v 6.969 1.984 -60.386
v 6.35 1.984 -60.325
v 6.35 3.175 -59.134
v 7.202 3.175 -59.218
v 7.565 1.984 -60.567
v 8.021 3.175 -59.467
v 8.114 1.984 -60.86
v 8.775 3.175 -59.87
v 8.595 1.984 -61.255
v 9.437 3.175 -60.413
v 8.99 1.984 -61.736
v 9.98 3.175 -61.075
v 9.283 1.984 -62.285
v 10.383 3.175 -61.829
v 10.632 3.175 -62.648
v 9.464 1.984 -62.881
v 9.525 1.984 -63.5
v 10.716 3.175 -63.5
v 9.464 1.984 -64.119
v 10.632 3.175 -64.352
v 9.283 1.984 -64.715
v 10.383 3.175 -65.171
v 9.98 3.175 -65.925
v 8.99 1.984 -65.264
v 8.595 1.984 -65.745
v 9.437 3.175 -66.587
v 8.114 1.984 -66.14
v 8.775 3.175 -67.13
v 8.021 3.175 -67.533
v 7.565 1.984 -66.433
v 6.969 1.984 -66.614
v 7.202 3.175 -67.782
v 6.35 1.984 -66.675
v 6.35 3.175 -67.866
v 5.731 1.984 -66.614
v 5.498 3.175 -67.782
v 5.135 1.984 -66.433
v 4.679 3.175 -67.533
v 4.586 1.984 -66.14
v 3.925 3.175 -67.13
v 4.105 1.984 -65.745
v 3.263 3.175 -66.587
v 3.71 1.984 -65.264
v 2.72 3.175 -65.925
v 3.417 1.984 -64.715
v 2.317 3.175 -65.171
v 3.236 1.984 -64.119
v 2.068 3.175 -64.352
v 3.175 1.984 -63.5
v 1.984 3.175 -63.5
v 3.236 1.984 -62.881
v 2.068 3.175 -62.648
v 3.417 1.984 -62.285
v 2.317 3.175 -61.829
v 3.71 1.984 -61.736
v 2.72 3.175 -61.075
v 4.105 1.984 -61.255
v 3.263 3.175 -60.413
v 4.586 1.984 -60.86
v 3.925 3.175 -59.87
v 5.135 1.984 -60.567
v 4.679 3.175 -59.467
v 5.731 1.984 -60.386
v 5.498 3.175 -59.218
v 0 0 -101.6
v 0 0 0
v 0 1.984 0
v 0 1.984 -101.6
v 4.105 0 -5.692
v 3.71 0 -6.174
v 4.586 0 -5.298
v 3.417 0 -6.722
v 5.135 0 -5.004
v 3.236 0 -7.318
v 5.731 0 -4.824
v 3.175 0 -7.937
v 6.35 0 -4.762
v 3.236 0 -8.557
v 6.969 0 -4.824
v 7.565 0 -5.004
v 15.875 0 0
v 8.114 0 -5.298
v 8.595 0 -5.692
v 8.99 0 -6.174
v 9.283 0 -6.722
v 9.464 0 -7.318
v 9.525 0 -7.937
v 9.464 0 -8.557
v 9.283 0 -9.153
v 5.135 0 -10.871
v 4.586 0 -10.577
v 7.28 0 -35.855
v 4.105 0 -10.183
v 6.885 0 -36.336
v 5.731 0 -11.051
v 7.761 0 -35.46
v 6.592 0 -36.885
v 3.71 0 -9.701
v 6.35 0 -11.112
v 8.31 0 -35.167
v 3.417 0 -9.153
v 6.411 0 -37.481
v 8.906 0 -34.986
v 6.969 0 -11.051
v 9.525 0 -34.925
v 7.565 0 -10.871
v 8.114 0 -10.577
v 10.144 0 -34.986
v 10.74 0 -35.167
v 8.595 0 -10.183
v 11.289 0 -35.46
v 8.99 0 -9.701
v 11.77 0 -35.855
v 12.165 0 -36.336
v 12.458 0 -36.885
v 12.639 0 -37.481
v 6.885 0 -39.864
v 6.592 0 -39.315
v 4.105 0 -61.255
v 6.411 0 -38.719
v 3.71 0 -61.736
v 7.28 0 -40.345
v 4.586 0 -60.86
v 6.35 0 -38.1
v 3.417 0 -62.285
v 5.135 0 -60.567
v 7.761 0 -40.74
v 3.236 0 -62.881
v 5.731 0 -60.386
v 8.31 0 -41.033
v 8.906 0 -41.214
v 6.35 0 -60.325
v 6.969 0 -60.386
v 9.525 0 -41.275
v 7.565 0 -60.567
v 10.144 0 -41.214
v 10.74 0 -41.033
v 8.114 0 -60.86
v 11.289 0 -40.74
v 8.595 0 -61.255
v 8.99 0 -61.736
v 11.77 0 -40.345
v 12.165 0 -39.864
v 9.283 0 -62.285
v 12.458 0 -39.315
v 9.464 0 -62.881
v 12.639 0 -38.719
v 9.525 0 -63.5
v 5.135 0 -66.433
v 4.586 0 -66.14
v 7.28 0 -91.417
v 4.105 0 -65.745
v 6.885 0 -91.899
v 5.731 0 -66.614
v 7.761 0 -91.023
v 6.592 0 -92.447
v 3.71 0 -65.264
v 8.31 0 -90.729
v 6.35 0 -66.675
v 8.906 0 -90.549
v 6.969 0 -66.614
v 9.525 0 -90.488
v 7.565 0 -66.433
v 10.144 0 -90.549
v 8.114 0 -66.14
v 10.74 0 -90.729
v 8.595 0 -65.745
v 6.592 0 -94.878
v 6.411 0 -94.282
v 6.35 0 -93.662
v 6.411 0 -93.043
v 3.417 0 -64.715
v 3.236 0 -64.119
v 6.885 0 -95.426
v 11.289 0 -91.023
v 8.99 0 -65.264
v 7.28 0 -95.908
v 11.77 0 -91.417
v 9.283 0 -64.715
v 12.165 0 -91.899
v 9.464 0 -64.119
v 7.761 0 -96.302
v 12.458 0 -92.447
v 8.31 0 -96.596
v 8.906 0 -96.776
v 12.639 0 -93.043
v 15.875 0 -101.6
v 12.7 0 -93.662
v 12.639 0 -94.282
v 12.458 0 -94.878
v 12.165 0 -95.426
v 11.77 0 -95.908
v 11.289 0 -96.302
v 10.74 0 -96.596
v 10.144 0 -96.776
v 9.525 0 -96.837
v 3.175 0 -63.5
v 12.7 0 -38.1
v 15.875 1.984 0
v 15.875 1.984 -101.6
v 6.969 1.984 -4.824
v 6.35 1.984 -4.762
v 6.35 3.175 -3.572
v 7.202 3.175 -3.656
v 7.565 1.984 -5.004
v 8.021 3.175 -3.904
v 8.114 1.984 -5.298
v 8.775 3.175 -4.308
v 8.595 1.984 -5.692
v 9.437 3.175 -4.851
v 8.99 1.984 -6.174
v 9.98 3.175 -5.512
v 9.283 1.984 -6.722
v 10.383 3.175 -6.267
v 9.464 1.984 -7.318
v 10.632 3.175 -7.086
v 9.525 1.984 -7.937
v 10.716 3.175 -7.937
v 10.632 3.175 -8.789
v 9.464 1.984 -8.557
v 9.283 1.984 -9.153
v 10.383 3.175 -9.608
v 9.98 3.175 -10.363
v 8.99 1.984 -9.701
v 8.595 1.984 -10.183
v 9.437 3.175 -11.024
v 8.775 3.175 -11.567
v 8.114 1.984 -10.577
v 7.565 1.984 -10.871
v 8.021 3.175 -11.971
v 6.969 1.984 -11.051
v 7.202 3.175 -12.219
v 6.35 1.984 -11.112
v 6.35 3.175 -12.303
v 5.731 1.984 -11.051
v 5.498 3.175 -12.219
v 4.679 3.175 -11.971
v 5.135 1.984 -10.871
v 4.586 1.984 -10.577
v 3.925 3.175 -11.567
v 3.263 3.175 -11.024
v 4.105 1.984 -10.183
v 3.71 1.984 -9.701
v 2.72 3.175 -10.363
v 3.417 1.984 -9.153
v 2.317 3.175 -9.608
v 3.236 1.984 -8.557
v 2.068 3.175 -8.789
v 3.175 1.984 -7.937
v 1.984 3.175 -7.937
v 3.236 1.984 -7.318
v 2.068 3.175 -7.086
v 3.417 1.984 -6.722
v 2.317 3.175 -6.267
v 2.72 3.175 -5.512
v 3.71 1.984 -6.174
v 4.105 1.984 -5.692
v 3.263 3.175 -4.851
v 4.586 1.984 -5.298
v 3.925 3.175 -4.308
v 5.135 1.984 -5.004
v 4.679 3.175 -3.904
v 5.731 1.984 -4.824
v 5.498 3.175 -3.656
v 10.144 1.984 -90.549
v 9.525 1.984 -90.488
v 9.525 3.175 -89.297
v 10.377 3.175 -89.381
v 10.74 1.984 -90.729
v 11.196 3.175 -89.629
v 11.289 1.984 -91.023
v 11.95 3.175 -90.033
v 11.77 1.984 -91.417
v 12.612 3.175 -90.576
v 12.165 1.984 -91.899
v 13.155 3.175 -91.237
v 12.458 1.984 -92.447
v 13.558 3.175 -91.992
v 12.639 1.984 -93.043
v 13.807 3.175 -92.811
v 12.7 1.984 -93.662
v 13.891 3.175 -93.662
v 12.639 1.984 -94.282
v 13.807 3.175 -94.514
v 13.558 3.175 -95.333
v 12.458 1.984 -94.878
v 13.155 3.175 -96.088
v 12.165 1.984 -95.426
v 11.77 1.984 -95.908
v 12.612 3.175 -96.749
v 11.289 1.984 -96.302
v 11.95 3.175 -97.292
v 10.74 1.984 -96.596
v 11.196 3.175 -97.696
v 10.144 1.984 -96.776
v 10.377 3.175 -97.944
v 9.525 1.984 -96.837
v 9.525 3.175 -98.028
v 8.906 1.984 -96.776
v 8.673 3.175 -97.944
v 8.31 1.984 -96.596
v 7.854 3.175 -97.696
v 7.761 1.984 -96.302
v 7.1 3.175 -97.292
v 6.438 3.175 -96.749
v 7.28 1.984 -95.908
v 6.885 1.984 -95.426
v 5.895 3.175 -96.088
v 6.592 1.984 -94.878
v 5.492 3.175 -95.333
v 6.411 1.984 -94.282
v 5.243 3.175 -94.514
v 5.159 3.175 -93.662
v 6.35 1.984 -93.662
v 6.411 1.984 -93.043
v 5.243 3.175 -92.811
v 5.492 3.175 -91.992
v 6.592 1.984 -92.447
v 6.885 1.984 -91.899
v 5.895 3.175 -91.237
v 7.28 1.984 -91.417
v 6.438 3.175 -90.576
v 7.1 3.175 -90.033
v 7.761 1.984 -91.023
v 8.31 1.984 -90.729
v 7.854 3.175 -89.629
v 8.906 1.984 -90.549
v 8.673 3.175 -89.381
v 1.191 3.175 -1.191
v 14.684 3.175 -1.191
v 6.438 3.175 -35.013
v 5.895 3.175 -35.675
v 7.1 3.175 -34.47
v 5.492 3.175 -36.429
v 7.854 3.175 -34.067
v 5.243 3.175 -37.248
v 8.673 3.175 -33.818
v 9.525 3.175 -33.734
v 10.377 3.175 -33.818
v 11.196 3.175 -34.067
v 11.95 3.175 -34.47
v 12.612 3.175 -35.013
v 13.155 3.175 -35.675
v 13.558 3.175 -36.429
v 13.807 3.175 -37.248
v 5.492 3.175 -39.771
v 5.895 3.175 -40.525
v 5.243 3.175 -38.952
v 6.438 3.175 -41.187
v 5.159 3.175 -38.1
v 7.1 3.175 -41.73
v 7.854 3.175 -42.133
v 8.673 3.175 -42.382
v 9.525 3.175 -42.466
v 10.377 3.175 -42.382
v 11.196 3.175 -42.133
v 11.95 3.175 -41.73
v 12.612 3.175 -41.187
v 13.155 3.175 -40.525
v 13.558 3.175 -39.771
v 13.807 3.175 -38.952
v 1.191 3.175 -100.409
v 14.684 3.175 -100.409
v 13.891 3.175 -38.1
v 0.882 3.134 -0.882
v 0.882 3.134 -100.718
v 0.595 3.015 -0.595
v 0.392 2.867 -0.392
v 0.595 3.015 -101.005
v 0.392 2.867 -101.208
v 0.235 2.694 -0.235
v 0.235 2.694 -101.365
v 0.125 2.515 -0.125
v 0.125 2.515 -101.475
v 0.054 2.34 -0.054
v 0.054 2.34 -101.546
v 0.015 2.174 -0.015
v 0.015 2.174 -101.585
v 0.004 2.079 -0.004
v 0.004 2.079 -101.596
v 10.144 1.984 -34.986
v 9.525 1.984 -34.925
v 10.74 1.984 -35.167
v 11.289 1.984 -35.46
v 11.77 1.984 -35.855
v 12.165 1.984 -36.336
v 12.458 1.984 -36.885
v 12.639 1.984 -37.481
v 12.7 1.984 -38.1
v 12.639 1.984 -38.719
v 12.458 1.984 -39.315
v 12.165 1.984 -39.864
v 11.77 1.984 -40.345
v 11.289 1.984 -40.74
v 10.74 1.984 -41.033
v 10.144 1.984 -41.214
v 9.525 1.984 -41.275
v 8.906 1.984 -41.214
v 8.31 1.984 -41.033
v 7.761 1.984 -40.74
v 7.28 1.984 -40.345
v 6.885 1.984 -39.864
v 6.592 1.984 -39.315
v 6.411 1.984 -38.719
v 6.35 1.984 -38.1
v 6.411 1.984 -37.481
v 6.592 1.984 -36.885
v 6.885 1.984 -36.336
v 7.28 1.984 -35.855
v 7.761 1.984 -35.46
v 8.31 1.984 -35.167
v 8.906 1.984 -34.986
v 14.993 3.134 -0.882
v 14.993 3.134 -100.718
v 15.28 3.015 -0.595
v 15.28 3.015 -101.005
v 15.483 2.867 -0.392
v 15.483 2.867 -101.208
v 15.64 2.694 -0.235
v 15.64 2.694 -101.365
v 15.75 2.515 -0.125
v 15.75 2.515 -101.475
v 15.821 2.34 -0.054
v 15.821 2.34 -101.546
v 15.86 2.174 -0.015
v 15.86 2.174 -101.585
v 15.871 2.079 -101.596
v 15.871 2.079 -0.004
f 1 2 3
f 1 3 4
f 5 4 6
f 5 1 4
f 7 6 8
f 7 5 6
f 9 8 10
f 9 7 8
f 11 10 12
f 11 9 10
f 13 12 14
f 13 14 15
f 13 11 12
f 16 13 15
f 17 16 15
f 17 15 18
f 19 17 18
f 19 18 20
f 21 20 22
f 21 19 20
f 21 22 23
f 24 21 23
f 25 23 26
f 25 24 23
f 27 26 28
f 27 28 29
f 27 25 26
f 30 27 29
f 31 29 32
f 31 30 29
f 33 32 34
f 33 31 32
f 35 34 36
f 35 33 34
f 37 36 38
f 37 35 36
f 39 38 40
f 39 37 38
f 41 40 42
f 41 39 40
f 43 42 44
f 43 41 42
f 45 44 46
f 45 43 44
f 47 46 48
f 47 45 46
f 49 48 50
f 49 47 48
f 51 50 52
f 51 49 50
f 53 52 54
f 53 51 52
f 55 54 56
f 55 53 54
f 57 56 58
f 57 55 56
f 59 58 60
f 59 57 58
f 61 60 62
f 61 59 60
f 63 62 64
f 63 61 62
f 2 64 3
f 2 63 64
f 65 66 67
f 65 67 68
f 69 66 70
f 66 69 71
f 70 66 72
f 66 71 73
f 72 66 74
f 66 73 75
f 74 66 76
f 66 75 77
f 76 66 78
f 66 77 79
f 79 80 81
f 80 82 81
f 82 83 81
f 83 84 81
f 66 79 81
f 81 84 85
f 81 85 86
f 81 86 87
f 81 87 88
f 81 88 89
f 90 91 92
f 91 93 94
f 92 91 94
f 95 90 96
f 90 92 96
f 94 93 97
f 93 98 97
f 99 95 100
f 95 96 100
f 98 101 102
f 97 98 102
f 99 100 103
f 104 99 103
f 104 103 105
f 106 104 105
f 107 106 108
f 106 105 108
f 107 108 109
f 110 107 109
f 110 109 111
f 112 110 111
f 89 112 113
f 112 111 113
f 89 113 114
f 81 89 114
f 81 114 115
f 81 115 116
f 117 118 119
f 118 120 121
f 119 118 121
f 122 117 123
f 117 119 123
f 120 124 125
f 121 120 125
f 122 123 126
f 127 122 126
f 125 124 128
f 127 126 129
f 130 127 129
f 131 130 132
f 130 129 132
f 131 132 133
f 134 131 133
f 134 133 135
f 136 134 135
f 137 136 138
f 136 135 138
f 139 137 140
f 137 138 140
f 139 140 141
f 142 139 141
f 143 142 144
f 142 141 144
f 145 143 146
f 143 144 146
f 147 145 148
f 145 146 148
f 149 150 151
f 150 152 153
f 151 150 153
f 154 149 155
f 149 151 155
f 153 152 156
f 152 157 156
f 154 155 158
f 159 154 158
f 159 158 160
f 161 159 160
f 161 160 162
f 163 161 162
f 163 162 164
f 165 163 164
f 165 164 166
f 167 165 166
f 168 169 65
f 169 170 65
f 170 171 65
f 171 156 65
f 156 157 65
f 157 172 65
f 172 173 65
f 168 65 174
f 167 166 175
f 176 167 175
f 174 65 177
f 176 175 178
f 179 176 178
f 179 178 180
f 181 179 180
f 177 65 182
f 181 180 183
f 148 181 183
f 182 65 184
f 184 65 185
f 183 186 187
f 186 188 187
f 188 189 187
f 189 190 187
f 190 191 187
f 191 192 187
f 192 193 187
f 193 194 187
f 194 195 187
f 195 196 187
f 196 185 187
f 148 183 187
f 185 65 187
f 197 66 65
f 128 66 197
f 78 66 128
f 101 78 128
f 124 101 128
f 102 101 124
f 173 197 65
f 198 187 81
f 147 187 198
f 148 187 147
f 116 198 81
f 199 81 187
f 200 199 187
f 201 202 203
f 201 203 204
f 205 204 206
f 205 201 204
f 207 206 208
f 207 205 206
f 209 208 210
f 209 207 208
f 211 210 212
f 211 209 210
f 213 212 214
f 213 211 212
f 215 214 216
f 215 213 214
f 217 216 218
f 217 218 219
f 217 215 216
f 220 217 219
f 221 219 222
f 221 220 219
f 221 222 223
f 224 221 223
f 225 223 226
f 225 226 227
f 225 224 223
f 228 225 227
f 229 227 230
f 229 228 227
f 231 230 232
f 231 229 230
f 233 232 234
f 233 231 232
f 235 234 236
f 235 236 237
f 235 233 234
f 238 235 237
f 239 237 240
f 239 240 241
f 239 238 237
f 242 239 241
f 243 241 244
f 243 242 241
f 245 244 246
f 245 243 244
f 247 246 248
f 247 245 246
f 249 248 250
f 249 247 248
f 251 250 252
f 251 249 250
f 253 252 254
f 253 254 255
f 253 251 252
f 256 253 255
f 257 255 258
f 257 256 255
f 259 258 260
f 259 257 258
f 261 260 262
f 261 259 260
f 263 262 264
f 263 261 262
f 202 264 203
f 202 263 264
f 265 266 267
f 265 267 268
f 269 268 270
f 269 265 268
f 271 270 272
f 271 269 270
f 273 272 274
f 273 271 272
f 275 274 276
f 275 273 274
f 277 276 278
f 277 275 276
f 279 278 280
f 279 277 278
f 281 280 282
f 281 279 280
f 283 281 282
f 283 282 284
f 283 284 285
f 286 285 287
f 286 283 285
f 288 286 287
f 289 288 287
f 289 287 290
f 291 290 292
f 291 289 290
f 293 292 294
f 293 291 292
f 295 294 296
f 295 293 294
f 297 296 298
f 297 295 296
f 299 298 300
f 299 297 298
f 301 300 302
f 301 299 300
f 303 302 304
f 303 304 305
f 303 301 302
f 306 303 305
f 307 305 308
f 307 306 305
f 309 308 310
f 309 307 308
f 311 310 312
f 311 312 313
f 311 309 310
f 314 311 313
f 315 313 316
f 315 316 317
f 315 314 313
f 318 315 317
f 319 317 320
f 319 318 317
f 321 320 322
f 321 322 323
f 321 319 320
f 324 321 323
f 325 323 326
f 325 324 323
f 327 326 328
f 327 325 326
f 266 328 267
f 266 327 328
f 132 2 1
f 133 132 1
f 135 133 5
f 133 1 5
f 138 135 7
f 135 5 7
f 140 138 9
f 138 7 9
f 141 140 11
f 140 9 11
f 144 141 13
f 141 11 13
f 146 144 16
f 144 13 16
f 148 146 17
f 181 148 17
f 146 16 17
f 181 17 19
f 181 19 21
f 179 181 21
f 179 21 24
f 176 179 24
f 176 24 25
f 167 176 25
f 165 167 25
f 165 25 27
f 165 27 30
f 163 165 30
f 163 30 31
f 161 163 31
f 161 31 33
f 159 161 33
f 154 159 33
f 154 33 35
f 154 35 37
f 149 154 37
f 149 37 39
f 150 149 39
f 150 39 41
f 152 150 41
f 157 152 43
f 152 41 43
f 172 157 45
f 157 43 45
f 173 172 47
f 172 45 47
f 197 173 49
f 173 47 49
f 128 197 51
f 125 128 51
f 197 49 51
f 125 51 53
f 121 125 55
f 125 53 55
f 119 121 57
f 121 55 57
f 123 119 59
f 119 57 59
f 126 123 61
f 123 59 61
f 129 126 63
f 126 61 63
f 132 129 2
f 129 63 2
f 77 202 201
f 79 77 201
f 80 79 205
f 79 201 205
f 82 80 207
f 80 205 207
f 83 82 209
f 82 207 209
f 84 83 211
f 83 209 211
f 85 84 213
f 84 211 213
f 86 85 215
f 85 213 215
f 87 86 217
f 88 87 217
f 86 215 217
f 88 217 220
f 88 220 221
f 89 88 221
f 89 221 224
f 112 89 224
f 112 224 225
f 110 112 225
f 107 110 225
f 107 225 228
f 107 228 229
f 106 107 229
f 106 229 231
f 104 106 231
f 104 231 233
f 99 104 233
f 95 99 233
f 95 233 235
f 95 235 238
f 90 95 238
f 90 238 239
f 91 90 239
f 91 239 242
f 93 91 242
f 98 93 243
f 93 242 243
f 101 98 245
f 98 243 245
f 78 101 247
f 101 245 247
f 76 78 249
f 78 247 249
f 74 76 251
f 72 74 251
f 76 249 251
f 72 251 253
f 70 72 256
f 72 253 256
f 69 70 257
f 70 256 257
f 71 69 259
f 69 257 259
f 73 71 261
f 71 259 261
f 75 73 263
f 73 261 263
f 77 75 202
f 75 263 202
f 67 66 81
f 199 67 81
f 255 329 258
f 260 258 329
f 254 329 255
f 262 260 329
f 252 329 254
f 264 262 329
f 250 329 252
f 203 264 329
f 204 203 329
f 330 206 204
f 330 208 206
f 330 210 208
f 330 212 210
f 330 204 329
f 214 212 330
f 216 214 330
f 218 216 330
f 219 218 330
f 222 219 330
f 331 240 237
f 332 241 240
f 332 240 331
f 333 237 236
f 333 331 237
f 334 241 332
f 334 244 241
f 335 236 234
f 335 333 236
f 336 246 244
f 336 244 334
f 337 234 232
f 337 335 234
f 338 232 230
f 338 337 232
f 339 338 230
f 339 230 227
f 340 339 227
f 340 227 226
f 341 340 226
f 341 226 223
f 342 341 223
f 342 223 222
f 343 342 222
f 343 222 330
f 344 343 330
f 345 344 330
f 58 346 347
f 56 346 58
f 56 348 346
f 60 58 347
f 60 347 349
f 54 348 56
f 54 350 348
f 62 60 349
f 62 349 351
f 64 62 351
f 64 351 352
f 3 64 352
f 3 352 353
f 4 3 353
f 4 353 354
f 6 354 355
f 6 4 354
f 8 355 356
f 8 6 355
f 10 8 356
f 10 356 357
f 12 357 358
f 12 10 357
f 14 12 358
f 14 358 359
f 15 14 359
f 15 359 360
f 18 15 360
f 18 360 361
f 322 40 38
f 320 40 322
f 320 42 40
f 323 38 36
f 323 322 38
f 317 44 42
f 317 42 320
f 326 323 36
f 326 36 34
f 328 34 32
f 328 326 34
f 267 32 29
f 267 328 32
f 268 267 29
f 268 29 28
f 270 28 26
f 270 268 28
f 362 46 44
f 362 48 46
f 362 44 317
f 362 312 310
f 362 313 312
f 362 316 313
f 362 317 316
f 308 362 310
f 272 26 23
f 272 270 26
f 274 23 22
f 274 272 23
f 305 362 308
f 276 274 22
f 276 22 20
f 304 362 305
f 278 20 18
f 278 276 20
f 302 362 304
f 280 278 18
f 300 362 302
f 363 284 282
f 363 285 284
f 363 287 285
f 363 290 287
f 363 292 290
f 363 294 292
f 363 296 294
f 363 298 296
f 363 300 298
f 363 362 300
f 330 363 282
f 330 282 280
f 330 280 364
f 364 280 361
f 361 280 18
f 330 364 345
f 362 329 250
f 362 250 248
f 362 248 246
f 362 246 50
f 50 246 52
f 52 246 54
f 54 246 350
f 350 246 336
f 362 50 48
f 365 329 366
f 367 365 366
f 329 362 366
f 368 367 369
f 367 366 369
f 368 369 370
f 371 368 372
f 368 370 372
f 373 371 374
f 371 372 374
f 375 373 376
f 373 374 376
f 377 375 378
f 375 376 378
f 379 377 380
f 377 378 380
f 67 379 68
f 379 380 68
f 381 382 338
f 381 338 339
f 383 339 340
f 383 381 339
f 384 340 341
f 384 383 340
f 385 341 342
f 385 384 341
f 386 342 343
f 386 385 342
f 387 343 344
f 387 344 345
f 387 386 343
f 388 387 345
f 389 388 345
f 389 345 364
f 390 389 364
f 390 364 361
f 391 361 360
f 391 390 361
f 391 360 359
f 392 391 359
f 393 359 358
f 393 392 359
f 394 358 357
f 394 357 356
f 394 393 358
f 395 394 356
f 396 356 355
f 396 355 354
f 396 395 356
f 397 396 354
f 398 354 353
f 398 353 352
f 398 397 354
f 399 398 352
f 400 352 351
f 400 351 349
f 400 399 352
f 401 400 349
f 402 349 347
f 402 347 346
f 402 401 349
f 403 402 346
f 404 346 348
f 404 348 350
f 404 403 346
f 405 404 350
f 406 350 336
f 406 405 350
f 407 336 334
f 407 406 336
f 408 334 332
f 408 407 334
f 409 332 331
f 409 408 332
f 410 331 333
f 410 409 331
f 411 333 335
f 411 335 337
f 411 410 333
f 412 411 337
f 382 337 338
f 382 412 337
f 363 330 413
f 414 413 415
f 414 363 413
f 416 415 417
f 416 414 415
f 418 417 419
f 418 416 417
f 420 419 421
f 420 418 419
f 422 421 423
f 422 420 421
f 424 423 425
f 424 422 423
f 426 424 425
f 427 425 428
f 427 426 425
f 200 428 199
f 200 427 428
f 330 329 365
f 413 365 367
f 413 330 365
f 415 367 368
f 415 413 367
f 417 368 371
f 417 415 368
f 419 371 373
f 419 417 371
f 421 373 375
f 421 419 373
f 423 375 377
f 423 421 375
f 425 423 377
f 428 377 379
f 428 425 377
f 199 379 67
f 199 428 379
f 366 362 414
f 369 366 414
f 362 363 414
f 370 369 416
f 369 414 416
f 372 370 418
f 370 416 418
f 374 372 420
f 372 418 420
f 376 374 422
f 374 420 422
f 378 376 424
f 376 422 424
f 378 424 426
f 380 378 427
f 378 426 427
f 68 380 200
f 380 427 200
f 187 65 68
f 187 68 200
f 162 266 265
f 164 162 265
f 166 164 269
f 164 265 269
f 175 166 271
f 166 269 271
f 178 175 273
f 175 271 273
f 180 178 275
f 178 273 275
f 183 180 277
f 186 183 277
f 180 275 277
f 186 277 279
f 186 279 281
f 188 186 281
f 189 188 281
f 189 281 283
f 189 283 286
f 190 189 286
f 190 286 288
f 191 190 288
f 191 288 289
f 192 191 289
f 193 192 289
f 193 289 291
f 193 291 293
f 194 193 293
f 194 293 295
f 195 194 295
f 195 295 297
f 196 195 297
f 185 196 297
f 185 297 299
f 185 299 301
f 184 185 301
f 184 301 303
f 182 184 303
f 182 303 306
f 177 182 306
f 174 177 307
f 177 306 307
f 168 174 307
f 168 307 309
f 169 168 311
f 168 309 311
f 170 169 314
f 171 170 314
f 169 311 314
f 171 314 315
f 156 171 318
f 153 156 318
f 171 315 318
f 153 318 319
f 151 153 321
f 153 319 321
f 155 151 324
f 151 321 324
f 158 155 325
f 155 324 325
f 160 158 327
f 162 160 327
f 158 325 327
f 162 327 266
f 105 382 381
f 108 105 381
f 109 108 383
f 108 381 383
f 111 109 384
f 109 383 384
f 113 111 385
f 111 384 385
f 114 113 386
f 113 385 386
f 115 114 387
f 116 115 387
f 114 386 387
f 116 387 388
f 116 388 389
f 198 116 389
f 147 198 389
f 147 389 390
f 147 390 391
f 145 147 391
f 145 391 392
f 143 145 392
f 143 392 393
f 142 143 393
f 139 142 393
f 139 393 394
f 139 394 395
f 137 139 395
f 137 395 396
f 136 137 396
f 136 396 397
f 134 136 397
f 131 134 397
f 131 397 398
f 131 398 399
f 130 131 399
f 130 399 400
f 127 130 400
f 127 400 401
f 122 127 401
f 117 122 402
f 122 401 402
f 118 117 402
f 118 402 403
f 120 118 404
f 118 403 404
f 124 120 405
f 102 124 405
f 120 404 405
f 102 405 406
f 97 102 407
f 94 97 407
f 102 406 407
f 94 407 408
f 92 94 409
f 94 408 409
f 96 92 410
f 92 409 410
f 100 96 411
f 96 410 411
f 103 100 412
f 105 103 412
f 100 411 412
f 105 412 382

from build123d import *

# Parameters (mm, degrees)
SKETCH1_W           = 15.875
SKETCH1_H           = 101.6
BOSS_EXTRUDE1_DEPTH = 3.175
SKETCH2_R           = 3.175
CUT_EXTRUDE1_DEPTH  = 103.881758587
CHAMFER1_SIZE       = 1.190625
FILLET1_R           = 1.190625


with BuildPart() as part:
    # Sketch1 → Boss-Extrude1 (new body)
    with BuildSketch(Plane(origin=(0, 0, 0), x_dir=(1, 0, 0), z_dir=(0, 1, 0))):
        with Locations((7.9375, 50.8)):
            Rectangle(SKETCH1_W, SKETCH1_H)
    extrude(amount=BOSS_EXTRUDE1_DEPTH)

    # Sketch2 → Cut-Extrude1 (cut, through all)
    with BuildSketch(Plane(origin=(0, 3.175, 0), x_dir=(1, 0, 0), z_dir=(0, 1, 0))):
        with Locations(Location((6.35, 63.5, 0), (0, 0, 270))):
            Circle(SKETCH2_R)
        with Locations(Location((9.525, 93.6625, 0), (0, 0, 270))):
            Circle(SKETCH2_R)
        with Locations(Location((9.525, 38.1, 0), (0, 0, 270))):
            Circle(SKETCH2_R)
        with Locations(Location((6.35, 7.9375, 0), (0, 0, 270))):
            Circle(SKETCH2_R)
    extrude(amount=-CUT_EXTRUDE1_DEPTH, mode=Mode.SUBTRACT)

    # Chamfer1
    chamfer1_edges = [part.edges().sort_by_distance(p)[0] for p in [
        (6.35, 3.175, -66.675),
        (9.525, 3.175, -96.8375),
        (9.525, 3.175, -41.275),
        (6.35, 3.175, -11.1125),
    ]]
    chamfer(chamfer1_edges, length=CHAMFER1_SIZE)

    # Fillet1
    fillet1_edges = [part.edges().sort_by_distance(p)[0] for p in [
        (15.875, 3.175, -50.8),
        (7.9375, 3.175, -101.6),
        (0, 3.175, -50.8),
        (7.9375, 3.175, 0),
    ]]
    fillet(fillet1_edges, radius=FILLET1_R)


solid = part.part
